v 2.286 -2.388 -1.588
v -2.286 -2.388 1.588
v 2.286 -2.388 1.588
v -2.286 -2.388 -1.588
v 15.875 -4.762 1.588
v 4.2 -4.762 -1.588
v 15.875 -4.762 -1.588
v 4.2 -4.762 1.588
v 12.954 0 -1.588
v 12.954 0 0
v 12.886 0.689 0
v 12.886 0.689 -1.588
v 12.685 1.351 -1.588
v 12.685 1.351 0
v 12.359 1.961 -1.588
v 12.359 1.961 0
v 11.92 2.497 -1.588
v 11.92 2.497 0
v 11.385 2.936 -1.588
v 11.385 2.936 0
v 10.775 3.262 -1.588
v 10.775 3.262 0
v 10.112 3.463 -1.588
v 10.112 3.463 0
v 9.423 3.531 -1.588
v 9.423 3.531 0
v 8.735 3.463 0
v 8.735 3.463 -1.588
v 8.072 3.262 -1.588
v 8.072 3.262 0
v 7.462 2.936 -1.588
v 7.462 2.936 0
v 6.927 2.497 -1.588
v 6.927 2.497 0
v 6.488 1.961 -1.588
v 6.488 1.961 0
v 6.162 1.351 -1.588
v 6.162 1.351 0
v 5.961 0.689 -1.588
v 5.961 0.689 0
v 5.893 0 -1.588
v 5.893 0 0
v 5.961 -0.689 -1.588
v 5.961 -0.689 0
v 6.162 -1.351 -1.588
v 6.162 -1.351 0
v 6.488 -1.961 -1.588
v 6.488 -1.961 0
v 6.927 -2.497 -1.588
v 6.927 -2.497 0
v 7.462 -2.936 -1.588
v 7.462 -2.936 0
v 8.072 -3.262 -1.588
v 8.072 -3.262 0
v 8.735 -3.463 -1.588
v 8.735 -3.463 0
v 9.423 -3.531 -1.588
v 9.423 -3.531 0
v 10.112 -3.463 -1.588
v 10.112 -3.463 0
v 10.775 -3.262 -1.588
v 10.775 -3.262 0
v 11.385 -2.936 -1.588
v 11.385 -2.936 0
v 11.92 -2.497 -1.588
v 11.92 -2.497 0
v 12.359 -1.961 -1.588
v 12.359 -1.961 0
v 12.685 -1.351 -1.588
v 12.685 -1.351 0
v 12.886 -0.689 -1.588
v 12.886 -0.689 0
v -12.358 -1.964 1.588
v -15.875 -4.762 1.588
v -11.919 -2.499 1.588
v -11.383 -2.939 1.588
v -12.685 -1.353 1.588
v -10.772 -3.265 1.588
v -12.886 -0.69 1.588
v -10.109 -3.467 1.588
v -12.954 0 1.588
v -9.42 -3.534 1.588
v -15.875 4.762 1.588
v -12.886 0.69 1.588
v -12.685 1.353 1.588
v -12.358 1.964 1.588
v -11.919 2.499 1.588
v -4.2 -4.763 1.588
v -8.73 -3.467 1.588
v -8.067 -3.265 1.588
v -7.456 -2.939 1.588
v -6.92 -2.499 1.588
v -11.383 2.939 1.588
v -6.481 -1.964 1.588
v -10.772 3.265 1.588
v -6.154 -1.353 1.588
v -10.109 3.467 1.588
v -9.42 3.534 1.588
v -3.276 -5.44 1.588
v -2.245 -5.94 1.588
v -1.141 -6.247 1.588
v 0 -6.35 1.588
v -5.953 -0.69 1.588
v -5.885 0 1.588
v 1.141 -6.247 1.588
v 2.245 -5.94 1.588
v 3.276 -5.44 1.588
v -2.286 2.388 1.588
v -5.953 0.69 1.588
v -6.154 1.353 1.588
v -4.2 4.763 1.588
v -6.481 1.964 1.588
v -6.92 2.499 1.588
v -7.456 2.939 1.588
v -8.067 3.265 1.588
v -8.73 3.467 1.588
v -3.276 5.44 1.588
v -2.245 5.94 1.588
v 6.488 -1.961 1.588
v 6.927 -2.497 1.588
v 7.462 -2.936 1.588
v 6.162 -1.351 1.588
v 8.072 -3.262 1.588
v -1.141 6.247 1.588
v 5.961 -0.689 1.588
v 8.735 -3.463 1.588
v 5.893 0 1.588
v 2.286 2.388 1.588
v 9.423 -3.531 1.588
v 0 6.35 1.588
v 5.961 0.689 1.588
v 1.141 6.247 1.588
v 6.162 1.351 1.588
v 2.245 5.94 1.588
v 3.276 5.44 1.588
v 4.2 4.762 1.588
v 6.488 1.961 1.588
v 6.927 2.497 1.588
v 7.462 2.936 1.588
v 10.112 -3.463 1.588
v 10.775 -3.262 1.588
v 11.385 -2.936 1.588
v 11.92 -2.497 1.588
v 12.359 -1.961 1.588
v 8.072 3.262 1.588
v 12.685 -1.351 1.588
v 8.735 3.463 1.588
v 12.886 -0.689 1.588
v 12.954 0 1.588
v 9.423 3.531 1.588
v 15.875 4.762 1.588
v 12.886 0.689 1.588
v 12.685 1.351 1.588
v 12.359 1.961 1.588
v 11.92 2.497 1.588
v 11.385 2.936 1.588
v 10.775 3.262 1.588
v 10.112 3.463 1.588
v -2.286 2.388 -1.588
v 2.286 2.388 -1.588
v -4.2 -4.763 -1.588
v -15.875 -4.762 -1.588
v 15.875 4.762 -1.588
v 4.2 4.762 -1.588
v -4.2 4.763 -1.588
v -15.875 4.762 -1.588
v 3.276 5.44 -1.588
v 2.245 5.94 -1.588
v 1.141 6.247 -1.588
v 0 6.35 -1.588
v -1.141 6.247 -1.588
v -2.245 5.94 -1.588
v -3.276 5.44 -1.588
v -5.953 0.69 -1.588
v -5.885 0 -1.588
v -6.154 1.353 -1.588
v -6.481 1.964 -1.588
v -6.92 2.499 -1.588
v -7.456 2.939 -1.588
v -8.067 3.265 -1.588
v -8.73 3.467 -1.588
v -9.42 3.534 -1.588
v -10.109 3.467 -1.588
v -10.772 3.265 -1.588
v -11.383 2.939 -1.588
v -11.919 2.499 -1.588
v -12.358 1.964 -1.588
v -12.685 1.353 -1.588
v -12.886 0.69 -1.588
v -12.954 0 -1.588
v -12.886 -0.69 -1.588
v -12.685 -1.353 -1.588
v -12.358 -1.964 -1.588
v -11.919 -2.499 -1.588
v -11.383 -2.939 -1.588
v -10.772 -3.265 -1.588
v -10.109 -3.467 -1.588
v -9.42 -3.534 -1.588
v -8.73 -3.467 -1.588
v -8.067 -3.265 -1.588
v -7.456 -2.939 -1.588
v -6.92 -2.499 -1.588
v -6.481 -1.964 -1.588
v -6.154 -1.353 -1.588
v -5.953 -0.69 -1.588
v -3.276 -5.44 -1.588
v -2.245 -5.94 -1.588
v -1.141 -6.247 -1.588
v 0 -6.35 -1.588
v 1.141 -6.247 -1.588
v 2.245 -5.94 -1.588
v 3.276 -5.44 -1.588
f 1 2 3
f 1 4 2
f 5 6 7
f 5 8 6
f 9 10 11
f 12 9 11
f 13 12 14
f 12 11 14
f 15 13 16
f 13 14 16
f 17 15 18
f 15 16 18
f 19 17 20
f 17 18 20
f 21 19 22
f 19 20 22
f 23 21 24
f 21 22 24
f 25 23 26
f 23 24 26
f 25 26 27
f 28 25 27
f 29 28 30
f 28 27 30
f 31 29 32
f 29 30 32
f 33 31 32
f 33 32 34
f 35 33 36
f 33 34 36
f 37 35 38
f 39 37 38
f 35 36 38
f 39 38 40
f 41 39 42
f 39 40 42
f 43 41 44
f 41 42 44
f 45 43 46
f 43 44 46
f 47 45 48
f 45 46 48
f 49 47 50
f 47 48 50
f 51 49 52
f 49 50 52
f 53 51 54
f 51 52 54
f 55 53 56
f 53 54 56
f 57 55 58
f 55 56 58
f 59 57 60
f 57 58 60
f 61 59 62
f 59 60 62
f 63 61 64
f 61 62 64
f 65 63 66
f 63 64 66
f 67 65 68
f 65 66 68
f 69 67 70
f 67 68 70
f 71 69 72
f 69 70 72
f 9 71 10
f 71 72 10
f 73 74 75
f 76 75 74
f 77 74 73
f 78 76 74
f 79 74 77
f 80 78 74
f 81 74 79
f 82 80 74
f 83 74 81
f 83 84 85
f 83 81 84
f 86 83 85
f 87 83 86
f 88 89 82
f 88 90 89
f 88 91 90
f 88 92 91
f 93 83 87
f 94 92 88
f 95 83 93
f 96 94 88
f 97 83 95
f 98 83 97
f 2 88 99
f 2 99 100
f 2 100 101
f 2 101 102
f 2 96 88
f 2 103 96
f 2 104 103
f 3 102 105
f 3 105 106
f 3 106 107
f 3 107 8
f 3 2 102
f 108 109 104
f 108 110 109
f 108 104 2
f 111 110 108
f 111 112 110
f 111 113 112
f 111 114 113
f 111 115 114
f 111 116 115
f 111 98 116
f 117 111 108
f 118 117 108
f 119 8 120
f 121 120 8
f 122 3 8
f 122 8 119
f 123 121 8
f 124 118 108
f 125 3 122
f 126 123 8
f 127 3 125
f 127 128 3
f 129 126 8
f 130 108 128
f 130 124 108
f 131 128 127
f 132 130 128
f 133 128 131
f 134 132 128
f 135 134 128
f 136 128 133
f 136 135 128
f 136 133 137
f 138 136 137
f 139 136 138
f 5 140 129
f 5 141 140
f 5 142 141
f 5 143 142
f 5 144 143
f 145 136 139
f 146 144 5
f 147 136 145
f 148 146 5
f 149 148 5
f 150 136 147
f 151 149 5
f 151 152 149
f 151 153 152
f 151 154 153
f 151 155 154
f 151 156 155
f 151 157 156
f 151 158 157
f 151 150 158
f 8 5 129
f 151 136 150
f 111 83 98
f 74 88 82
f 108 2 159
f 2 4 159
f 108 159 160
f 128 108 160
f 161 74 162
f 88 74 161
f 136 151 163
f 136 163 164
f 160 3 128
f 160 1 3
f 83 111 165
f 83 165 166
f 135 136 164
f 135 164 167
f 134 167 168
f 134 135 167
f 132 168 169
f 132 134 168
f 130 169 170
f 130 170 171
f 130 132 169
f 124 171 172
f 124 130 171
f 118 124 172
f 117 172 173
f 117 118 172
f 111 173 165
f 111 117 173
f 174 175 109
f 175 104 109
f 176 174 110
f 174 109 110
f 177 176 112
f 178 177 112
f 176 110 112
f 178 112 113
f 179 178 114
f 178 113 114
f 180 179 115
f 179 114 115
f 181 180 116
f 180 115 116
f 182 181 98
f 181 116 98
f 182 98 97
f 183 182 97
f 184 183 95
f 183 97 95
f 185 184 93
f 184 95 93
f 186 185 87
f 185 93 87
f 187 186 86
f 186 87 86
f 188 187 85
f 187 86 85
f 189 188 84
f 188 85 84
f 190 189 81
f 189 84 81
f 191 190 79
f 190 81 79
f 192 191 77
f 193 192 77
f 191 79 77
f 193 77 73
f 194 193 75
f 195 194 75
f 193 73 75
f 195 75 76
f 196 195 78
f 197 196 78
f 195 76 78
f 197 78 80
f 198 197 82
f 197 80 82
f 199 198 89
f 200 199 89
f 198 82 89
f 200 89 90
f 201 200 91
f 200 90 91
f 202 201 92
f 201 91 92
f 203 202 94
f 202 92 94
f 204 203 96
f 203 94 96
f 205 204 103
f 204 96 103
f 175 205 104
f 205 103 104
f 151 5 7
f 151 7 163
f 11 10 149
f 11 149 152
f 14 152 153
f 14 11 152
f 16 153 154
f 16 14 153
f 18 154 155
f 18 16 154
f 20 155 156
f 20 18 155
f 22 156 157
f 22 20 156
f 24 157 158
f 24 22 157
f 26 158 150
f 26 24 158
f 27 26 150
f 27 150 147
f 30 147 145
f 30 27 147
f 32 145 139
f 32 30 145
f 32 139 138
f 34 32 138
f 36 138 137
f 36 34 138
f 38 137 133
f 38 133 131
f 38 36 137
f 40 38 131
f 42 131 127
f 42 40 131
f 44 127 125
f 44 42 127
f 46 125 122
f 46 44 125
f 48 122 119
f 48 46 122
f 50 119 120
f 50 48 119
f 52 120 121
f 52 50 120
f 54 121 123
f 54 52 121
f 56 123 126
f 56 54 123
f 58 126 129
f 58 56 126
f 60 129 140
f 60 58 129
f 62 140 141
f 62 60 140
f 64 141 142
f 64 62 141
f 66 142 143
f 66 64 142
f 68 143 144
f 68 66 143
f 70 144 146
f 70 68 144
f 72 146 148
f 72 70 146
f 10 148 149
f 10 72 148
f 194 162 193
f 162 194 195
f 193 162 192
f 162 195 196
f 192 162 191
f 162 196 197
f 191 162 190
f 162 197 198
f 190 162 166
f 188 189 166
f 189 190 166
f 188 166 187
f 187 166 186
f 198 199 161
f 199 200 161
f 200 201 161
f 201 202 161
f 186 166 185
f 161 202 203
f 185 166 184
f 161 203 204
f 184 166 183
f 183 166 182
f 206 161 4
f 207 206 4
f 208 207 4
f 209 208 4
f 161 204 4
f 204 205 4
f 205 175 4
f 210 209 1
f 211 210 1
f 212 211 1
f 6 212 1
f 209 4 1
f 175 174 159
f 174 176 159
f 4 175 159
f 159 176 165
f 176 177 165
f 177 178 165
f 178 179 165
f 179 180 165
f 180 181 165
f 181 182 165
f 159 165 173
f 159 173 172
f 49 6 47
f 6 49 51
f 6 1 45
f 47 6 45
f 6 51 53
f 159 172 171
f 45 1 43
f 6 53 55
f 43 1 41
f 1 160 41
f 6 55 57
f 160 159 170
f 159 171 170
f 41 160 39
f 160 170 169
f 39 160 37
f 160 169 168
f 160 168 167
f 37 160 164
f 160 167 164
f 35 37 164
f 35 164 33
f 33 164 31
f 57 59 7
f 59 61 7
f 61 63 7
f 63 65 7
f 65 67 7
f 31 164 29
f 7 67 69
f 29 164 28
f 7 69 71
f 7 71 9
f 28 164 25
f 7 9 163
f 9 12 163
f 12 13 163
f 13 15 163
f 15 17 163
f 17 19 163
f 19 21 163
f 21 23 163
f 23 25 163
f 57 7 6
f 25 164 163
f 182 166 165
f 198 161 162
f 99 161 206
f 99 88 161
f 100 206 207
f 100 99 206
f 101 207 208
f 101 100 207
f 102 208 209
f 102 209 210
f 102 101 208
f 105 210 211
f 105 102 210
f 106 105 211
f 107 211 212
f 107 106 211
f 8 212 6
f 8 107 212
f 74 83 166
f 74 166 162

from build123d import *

# Parameters (mm, degrees)
F2_DEPTH = 1.5875
F1_W     = 4.572
F1_H     = 4.7752
F1_R     = 3.5306
F1_R_2   = 3.5344711505
F3_DEPTH = 1.5875


with BuildPart() as f2:
    # F0 (on Top) → F2 (new body, symmetric)
    with BuildSketch(Plane.XY):
        with BuildLine():
            ThreePointArc((4.2001302063, -4.7625), (5.7876302063, -2.6126302063), (6.35, 0))
            ThreePointArc((6.35, 0), (5.7876302063, 2.6126302063), (4.2001302063, 4.7625))
            Line((4.2001302063, 4.7625), (3.175, 4.7625))
            Line((3.175, 4.7625), (3.175, -4.7625))
            Line((3.175, -4.7625), (4.2001302063, -4.7625))
        make_face()
        with BuildLine():
            ThreePointArc((4.2001302063, 4.7625), (5.7876302063, 2.6126302063), (6.35, 0))
            ThreePointArc((6.35, 0), (5.7876302063, -2.6126302063), (4.2001302063, -4.7625))
            Line((4.2001302063, -4.7625), (15.875, -4.7625))
            Line((15.875, -4.7625), (15.875, 4.7625))
            Line((15.875, 4.7625), (4.2001302063, 4.7625))
        make_face()
        with BuildLine():
            Line((3.175, 4.7625), (4.2001302063, 4.7625))
            ThreePointArc((4.2001302063, 4.7625), (0, 6.35), (-4.2001302063, 4.7625))
            Line((-4.2001302063, 4.7625), (-3.175, 4.7625))
            Line((-3.175, 4.7625), (-3.175, -4.7625))
            Line((-3.175, -4.7625), (-4.2001302063, -4.7625))
            ThreePointArc((-4.2001302063, -4.7625), (0, -6.35), (4.2001302063, -4.7625))
            Line((4.2001302063, -4.7625), (3.175, -4.7625))
            Line((3.175, -4.7625), (3.175, 4.7625))
        make_face()
        with BuildLine():
            Line((-3.175, 4.7625), (-4.2001302063, 4.7625))
            ThreePointArc((-4.2001302063, 4.7625), (-6.35, 0), (-4.2001302063, -4.7625))
            Line((-4.2001302063, -4.7625), (-3.175, -4.7625))
            Line((-3.175, -4.7625), (-3.175, 4.7625))
        make_face()
        with BuildLine():
            ThreePointArc((-4.2001302063, -4.7625), (-6.35, 0), (-4.2001302063, 4.7625))
            Line((-4.2001302063, 4.7625), (-15.875, 4.7625))
            Line((-15.875, 4.7625), (-15.875, -4.7625))
            Line((-15.875, -4.7625), (-4.2001302063, -4.7625))
        make_face()
    extrude(amount=F2_DEPTH, both=True)

    # F1 (on Top) → F3 (cut, symmetric)
    with BuildSketch(Plane.XY):
        Rectangle(F1_W, F1_H)
        with Locations((9.4234, 0)):
            Circle(F1_R)
        with Locations((-9.4195288495, 0)):
            Circle(F1_R_2)
    extrude(amount=F3_DEPTH, both=True, mode=Mode.SUBTRACT)


solid = f2.part
